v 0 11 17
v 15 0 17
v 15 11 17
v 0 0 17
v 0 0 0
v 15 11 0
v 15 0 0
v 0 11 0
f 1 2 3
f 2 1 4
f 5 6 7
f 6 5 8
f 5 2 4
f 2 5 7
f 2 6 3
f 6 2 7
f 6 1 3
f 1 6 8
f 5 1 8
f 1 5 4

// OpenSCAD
// Generated by SolidPython 1.0.1 on 2020-07-29 00:46:55


cube(size = [15, 11, 17]);
/***********************************************
*********      SolidPython code:      **********
************************************************
 
# import packages: SolidPython
from solid import *
from solid.utils import *
from itertools import chain, combinations, permutations


class Resize:

    def __init__(self, scad_file):
        self.scad_file = scad_file
        #self.scad_file = import_scad(scad_file)
        # cone/cylinder param:
        self.r1 = 0
        self.r2 = 0
        self.h = 0
        # rectangular prism param:
        self.w = 0
        self.l = 0
        # ellipse param:
        self.r = 0

    # import OpenScad code (file name corresponds to shape)


    # classify shape + parameters
    def assign(self, param1, param2, param3):
        if self.scad_file == 'cone.scad':
            self.r1 = param1
            self.r2 = param2
            self.h = param3
        elif self.scad_file == 'cylinder.scad':
            self.r1 = param1
            self.r2 = param2
            self.h = param3
        elif self.scad_file == 'rectangularPrism.scad':
            self.h = param1
            self.l = param2
            self.w = param3
        else:
            self.r = param1
            self.h = param2

    # resize parameters
    def iterate(self):
        x = range(3, 20, 2)
        i = 1
        if self.scad_file == 'cone.scad':
            tempList = list(permutations(x, 2))
            for temp in tempList:
                param1 = temp[0]
                param2 = temp[1]
                filepath = 'produced_scad_files/' + 'cone' + str(param1) + '_' + str(param2) + '_' + '.scad'
                scad_render_to_file(cylinder(h=param1, r1=param2, r2=0), filepath)

        elif self.scad_file == 'cylinder.scad':
            tempList = list(permutations(x, 3))
            for temp in tempList:
                param1 = temp[0]
                param2 = temp[1]
                filepath = 'produced_scad_files/' + 'cylinder' + str(param1) + '_' + str(param2) + '_' + '.scad'
                scad_render_to_file(cylinder(h=param1, r1=param2, r2=param2), filepath)

        elif self.scad_file == 'rectangularPrism.scad':
            tempList = list(permutations(x, 3))
            for temp in tempList:
                param1 = temp[0]
                param2 = temp[1]
                param3 = temp[2]
                filepath = 'produced_scad_files/' + 'rectangularPrism' + str(param1) + '_' + str(param2) + '_' + str(
                    param3) + '.scad'
                scad_render_to_file(cube(size=(param1, param2, param3)), filepath)

        elif self.scad_file == 'ellipse.scad':
            tempList = list(permutations(x, 4))
            for temp in tempList:
                param1 = temp[0]
                param2 = temp[1]
                param3 = temp[2]
                param4 = temp[3]
                filepath = 'produced_scad_files/' + 'ellipse' + str(param1) + '_' + str(param2) + '_' + str(param3) + '_' + str(param4) + '.scad'
                scad_render_to_file(scale([param1, param2, param3])(sphere(r=param4)), filepath)

    def render_to_scadfile(self):
        scad_render_to_file(scad, 'example.scad') 
 
************************************************/
